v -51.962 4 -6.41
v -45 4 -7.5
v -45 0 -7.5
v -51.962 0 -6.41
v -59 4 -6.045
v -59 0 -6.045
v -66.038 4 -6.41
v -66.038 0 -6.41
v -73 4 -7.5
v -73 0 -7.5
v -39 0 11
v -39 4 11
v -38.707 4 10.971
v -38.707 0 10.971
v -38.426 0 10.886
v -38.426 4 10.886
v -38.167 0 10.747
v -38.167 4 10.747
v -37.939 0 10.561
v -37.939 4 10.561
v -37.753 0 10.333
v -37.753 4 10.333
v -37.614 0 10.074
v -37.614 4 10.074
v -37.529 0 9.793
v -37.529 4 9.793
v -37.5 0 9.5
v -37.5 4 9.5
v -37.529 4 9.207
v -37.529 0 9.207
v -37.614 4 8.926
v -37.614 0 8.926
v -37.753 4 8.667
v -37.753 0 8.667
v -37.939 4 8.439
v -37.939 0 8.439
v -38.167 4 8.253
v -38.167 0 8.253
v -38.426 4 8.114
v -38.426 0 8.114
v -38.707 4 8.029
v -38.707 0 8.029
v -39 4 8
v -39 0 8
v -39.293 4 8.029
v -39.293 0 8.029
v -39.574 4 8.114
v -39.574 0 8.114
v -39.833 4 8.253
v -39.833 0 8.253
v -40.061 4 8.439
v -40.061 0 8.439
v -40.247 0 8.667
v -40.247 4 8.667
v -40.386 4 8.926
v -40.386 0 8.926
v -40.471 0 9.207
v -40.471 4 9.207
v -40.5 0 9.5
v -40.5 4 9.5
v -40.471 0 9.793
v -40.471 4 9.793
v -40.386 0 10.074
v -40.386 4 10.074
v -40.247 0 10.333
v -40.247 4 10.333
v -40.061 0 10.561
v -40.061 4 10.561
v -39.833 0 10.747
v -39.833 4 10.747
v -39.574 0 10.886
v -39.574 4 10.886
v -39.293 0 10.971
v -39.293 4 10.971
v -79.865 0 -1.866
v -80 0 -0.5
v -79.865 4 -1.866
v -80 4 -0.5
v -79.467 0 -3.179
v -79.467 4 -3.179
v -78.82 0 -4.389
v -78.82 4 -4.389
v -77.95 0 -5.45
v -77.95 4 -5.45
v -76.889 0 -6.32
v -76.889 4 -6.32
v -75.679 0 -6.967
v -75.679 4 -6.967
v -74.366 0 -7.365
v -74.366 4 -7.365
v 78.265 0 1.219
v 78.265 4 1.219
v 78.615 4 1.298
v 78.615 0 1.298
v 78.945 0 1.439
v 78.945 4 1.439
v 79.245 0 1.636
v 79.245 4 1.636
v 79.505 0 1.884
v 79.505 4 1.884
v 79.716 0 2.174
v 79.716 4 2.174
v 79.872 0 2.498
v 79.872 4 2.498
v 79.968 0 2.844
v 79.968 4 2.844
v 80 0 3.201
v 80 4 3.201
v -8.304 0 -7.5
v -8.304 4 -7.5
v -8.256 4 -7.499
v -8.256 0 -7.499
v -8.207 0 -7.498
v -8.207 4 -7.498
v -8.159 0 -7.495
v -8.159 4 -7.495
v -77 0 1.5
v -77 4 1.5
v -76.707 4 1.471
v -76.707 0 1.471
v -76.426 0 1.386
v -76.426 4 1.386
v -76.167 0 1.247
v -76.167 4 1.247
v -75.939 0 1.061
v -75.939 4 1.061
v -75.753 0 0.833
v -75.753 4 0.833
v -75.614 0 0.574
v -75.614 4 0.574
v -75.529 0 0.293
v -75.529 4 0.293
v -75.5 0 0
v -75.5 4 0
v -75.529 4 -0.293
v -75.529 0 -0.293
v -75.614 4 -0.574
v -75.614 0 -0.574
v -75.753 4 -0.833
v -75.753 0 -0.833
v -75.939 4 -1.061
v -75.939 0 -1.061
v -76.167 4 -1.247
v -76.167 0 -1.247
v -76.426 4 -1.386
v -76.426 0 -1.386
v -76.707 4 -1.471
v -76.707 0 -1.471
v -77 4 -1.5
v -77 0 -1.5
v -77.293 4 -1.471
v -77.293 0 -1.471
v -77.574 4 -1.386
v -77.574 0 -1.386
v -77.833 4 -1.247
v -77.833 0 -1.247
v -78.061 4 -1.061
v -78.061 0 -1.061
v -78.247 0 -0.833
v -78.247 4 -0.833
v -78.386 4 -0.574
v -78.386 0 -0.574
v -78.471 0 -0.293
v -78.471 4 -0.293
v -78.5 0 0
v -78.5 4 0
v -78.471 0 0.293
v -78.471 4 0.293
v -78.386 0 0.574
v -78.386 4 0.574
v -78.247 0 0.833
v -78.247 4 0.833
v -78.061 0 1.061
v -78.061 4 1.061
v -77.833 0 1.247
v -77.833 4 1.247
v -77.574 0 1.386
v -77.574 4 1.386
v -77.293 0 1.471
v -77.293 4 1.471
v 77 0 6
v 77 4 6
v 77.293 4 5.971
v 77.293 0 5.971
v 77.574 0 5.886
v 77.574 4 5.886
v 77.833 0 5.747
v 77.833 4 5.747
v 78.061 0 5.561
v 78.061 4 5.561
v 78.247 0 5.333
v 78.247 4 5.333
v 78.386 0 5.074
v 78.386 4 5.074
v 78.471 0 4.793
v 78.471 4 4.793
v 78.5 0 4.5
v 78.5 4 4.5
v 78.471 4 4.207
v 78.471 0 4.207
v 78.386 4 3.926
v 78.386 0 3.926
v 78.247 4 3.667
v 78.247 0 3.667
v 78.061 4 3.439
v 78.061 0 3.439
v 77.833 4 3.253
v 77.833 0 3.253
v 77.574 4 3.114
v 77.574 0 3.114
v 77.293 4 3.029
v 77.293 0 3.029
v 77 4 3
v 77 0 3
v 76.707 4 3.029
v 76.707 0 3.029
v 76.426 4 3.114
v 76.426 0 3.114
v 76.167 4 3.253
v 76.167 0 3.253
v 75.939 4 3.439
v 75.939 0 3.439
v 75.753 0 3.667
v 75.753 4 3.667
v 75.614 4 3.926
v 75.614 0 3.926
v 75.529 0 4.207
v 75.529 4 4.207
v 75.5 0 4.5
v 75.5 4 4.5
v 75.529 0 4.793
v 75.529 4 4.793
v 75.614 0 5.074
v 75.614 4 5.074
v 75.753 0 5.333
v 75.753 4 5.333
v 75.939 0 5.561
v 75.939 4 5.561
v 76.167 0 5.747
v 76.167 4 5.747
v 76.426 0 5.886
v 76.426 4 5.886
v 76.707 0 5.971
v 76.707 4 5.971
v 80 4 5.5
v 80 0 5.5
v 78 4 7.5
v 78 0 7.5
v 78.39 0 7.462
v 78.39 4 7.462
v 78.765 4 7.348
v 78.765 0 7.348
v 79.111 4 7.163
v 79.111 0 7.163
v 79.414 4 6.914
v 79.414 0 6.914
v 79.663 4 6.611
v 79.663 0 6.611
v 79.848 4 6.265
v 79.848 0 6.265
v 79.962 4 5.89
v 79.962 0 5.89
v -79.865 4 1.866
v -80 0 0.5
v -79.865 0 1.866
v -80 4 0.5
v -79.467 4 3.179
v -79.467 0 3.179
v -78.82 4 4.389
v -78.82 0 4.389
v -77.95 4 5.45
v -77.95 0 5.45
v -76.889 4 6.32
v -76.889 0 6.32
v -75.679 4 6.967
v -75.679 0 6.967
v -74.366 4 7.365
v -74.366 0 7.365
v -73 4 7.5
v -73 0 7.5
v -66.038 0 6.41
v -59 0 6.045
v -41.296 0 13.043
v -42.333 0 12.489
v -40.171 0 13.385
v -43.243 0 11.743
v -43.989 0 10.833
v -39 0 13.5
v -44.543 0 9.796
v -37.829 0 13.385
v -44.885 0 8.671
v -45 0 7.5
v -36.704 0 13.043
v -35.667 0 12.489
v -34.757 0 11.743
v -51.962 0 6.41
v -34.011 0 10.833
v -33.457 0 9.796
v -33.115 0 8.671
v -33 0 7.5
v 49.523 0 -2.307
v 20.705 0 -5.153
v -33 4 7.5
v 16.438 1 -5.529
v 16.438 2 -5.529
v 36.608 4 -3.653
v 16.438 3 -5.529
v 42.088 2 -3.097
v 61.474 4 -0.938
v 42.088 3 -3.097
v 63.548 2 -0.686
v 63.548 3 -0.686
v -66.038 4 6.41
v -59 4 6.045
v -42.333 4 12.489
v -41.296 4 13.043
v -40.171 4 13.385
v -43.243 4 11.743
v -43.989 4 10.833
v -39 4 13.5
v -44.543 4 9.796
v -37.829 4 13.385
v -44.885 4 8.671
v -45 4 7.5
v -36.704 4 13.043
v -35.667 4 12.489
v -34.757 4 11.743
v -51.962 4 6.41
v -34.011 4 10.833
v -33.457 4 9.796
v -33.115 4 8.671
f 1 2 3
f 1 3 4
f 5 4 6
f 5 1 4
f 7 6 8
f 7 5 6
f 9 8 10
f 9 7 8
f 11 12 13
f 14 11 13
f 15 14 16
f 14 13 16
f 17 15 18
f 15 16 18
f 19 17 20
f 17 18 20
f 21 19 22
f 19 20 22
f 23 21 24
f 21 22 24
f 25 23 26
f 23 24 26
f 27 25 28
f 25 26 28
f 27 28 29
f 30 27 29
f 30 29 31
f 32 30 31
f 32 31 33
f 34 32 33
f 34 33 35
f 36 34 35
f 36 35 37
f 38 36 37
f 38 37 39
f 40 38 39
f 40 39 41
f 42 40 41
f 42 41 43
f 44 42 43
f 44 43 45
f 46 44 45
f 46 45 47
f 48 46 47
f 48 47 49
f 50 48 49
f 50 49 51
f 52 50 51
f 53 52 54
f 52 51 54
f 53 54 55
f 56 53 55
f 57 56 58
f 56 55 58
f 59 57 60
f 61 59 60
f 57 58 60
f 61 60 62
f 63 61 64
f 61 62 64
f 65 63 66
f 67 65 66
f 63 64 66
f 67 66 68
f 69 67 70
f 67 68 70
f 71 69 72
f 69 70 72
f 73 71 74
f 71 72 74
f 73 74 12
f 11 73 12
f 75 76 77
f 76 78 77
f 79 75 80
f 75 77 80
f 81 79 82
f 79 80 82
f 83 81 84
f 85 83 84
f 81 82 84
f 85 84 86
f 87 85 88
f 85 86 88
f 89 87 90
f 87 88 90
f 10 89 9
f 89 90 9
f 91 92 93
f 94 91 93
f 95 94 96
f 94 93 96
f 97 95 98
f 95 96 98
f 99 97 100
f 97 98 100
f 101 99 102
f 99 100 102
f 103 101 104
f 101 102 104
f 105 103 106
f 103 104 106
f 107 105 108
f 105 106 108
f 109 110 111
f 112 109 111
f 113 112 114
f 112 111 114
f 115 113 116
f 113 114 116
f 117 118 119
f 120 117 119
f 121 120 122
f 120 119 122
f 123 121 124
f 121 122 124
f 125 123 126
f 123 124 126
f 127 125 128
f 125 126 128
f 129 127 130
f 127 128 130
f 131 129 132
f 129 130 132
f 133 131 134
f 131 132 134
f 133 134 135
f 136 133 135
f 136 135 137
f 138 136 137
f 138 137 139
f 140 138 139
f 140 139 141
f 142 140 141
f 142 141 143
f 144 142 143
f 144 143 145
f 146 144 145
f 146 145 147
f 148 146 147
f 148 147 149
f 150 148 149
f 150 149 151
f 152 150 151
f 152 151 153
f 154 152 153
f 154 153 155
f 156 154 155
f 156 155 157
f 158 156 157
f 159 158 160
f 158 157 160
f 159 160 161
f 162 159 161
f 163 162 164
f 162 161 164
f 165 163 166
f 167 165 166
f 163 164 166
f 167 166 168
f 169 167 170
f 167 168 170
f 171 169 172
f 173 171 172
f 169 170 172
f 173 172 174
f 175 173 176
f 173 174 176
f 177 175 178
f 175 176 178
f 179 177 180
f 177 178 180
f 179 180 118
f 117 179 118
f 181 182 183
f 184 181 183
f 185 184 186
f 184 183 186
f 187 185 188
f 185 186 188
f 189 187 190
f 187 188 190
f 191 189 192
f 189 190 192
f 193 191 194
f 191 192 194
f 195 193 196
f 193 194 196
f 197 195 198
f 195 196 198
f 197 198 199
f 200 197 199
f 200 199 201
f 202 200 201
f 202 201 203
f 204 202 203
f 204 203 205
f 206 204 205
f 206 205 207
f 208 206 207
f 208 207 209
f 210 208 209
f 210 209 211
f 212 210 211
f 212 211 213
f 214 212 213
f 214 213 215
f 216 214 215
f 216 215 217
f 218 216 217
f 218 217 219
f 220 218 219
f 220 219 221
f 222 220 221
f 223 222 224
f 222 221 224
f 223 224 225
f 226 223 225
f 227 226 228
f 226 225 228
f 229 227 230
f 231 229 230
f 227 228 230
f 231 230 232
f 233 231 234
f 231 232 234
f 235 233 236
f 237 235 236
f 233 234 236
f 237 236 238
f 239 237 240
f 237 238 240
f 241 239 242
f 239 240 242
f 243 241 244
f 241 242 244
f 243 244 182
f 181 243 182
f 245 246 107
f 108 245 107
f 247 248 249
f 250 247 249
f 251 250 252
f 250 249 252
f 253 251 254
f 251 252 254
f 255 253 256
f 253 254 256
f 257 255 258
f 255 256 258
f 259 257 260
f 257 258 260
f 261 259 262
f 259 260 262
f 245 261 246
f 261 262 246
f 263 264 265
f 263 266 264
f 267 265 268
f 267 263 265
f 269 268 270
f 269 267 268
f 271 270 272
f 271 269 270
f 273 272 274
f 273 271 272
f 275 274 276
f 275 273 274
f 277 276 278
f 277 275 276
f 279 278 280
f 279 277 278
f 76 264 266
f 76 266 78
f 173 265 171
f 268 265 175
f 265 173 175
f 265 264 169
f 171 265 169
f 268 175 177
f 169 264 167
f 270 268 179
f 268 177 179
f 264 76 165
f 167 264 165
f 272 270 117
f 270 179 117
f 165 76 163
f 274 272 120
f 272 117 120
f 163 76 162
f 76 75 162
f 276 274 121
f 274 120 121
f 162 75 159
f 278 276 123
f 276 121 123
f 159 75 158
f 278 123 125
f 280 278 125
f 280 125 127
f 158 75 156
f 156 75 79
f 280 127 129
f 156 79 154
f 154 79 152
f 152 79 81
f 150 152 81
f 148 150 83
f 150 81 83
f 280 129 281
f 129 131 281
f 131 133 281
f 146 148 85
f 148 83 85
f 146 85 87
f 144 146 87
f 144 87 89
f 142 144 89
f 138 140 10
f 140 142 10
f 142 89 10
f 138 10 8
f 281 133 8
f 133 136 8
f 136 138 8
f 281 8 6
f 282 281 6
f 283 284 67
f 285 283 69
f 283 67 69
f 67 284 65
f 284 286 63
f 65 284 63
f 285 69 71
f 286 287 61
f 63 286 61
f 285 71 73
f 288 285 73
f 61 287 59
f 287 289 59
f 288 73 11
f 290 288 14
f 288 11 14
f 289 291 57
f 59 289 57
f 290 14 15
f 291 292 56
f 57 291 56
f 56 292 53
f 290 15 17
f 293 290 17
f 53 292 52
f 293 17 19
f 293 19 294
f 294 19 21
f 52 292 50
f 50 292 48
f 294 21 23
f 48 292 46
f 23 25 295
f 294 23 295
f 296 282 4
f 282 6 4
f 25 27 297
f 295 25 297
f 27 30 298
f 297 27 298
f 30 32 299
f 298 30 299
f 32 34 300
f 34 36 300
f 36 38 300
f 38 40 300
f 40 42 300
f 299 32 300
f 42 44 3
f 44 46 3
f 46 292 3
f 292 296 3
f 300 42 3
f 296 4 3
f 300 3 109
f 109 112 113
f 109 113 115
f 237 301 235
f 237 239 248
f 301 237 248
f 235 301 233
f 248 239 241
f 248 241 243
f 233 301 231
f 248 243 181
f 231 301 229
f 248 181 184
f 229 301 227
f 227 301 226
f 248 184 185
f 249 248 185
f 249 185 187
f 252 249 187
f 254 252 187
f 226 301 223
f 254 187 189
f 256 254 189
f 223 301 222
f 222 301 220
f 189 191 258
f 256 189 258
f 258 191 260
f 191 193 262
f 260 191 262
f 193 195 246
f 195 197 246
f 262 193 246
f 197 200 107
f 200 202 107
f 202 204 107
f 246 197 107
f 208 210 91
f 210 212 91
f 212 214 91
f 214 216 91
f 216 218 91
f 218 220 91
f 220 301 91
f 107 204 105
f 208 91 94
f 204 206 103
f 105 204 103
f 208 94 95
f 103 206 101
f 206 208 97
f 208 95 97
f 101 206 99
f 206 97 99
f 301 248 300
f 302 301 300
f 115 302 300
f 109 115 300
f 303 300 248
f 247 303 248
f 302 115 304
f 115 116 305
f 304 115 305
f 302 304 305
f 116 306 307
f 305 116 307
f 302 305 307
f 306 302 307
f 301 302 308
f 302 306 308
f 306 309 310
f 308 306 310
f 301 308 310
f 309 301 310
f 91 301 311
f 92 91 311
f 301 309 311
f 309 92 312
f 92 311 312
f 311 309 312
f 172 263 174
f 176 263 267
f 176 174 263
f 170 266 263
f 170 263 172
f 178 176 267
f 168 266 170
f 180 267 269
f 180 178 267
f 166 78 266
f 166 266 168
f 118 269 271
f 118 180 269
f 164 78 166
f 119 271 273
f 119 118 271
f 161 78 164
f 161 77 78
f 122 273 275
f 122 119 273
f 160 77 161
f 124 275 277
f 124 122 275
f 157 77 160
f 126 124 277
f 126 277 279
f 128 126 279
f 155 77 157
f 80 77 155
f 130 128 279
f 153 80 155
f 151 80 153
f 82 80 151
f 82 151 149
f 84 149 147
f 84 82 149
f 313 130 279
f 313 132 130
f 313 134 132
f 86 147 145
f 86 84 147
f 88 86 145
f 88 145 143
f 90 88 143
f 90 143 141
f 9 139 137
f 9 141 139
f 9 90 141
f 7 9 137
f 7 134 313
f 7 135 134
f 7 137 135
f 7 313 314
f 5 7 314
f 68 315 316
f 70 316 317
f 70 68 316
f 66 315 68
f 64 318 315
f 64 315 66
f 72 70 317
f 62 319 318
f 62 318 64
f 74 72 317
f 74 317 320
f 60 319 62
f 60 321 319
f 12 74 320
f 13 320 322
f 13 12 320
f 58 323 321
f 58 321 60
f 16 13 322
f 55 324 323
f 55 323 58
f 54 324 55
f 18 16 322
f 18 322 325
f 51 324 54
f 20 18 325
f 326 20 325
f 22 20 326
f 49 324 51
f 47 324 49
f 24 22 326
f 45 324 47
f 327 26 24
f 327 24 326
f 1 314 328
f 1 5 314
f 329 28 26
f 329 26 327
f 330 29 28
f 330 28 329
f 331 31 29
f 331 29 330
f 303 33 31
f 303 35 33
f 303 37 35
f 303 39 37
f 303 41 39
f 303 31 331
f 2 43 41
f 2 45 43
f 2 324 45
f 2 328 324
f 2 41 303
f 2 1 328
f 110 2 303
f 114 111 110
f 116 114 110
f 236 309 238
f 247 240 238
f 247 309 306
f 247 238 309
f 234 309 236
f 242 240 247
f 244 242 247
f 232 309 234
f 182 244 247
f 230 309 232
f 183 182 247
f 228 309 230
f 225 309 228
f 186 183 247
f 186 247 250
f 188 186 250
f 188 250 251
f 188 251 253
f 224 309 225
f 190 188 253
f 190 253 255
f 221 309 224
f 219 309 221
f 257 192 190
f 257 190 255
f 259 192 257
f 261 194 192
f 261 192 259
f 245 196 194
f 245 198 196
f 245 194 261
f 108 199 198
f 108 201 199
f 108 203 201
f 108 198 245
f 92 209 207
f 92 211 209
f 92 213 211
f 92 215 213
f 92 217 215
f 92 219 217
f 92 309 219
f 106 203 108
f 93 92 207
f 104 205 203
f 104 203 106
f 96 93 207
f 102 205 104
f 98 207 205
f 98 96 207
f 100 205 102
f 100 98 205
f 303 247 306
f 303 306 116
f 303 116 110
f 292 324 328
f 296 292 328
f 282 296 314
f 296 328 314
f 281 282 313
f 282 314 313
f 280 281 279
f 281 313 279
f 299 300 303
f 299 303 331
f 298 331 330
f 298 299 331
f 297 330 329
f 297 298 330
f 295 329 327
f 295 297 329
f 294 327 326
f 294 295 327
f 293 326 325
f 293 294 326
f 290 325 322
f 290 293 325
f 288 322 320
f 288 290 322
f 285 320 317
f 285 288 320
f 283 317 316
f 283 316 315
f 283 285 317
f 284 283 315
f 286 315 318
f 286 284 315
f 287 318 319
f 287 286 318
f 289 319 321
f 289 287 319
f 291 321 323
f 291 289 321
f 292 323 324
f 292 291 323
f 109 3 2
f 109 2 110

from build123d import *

# Parameters (mm, degrees)
SKETCH2_W           = 160
SKETCH2_H           = 15
BOSS_EXTRUDE1_DEPTH = 4
BOSS_EXTRUDE2_DEPTH = 4
SKETCH5_R           = 1.5
CUT_EXTRUDE1_DEPTH  = 82.229612827
CUT_EXTRUDE2_DEPTH  = 82.229612827
FILLET1_R           = 7
FILLET2_R           = 2
CUT_EXTRUDE3_DEPTH  = 82.229612947


with BuildPart() as part:
    # Sketch2 → Boss-Extrude1 (new body)
    with BuildSketch(Plane(origin=(0, 0, 0), x_dir=(1, 0, 0), z_dir=(0, 1, 0))):
        Rectangle(SKETCH2_W, SKETCH2_H)
    extrude(amount=BOSS_EXTRUDE1_DEPTH)

    # Sketch4 → Boss-Extrude2 (add)
    with BuildSketch(Plane(origin=(0, 0, 0), x_dir=(1, 0, 0), z_dir=(0, 1, 0))):
        with BuildLine():
            Line((-45, -7.5), (-33, -7.5))
            ThreePointArc((-33, -7.5), (-39, -13.5), (-45, -7.5))
        make_face()
    extrude(amount=BOSS_EXTRUDE2_DEPTH)

    # Sketch5 → Cut-Extrude1 (cut, through all)
    with BuildSketch(Plane(origin=(0, 4, 0), x_dir=(1, 0, 0), z_dir=(0, 1, 0))):
        with Locations(Location((-77, 0, 0), (0, 0, 270))):
            Circle(SKETCH5_R)
        with Locations(Location((-39, -9.5, 0), (0, 0, 270))):
            Circle(SKETCH5_R)
        with Locations(Location((77, -4.5, 0), (0, 0, 270))):
            Circle(SKETCH5_R)
    extrude(amount=-CUT_EXTRUDE1_DEPTH, mode=Mode.SUBTRACT)

    # Sketch6 → Cut-Extrude2 (cut, through all)
    with BuildSketch(Plane(origin=(0, 4, 0), x_dir=(1, 0, 0), z_dir=(0, 1, 0))):
        with BuildLine():
            Line((80, 7.5), (-8.231546833, 7.5))
            add(Edge.make_bspline(
                [(-8.231546833, 7.5), (14.290081903, 5.870335425), (49.538058278, 2.848640909), (69.508001123, -0.069415723), (80, -1.449425232)],
                knots=[0, 0, 0, 0, 0, 1, 1, 1, 1, 1], degree=4))
            Line((80, -1.449425232), (80, 7.5))
        make_face()
    extrude(amount=-CUT_EXTRUDE2_DEPTH, mode=Mode.SUBTRACT)

    # Fillet1
    fillet1_edges = [part.edges().sort_by_distance(p)[0] for p in [
        (-80, 2, -7.5),
        (-80, 2, 7.5),
    ]]
    fillet(fillet1_edges, radius=FILLET1_R)

    # Fillet2
    # the kernel refuses this fillet: 2 mm, written as the material it takes off along each edge
    with BuildSketch(Plane(origin=(-8.231546833, 4, -7.5), x_dir=(-1, 0, 0), z_dir=(0, -1, 0))) as fillet2_piece_1:
        with BuildLine():
            CenterArc((0.072290514, -2), FILLET2_R, 90, 4.141569808)
            Line((-0.072151683, -0.005222706), (-0.075040527, 0.03467284))
            ThreePointArc((-0.075040527, 0.03467284), (-0.038963722, 0.037284715), (-0.002886851, 0.03989569))
            Line((-0.002886851, 0.03989569), (0, 0.04))
            Line((0, 0.04), (0.072290514, 0.04))
            Line((0.072290514, 0.04), (0.072290514, 0))
        make_face()
    extrude(amount=4, mode=Mode.SUBTRACT)
    with BuildSketch(Plane(origin=(80, 0, 7.5), x_dir=(-1, 0, 0), z_dir=(0, 1, 0))) as fillet2_piece_2:
        with BuildLine():
            CenterArc((FILLET2_R, -FILLET2_R), FILLET2_R, 90, 90)
            Line((0, -FILLET2_R), (-FILLET2_R * 0.02, -FILLET2_R))
            Line((-FILLET2_R * 0.02, -FILLET2_R), (-FILLET2_R * 0.02, FILLET2_R * 0.02))
            Line((-FILLET2_R * 0.02, FILLET2_R * 0.02), (FILLET2_R, FILLET2_R * 0.02))
            Line((FILLET2_R, FILLET2_R * 0.02), (FILLET2_R, 0))
        make_face()
    extrude(amount=4, mode=Mode.SUBTRACT)
    with BuildSketch(Plane(origin=(80, 4, 1.449425232), x_dir=(-0.9912995401068606, 0, -0.13162530829565738), z_dir=(0, -1, 0))) as fillet2_piece_3:
        with BuildLine():
            CenterArc((1.751992616, -1.999999306), FILLET2_R, 90.047746208, 82.388731024)
            Line((-0.230606464, -1.736748689), (-0.270258446, -1.731483677))
            Line((-0.270258446, -1.731483677), (-0.039651982, 0.005265012))
            Line((-0.039651982, 0.005265012), (4.9175e-05, 0.03999997))
            ThreePointArc((4.9175e-05, 0.03999997), (0.875159086, 0.039555606), (1.750292626, 0.039999986))
            Line((1.750292626, 0.039999986), (1.750325959, 0))
        make_face()
    extrude(amount=4, mode=Mode.SUBTRACT)

    # Sketch7 → Cut-Extrude3 (cut, through all)
    with BuildSketch(Plane(origin=(0, 4, 0), x_dir=(1, 0, 0), z_dir=(0, 1, 0))):
        with BuildLine():
            Line((-73, -7.5), (-45, -7.5))
            ThreePointArc((-45, -7.5), (-59, -6.045404943), (-73, -7.5))
        make_face()
        with BuildLine():
            Line((-73, 7.5), (-45, 7.5))
            ThreePointArc((-45, 7.5), (-59, 6.045404943), (-73, 7.5))
        make_face()
    extrude(amount=-CUT_EXTRUDE3_DEPTH, mode=Mode.SUBTRACT)


solid = part.part
